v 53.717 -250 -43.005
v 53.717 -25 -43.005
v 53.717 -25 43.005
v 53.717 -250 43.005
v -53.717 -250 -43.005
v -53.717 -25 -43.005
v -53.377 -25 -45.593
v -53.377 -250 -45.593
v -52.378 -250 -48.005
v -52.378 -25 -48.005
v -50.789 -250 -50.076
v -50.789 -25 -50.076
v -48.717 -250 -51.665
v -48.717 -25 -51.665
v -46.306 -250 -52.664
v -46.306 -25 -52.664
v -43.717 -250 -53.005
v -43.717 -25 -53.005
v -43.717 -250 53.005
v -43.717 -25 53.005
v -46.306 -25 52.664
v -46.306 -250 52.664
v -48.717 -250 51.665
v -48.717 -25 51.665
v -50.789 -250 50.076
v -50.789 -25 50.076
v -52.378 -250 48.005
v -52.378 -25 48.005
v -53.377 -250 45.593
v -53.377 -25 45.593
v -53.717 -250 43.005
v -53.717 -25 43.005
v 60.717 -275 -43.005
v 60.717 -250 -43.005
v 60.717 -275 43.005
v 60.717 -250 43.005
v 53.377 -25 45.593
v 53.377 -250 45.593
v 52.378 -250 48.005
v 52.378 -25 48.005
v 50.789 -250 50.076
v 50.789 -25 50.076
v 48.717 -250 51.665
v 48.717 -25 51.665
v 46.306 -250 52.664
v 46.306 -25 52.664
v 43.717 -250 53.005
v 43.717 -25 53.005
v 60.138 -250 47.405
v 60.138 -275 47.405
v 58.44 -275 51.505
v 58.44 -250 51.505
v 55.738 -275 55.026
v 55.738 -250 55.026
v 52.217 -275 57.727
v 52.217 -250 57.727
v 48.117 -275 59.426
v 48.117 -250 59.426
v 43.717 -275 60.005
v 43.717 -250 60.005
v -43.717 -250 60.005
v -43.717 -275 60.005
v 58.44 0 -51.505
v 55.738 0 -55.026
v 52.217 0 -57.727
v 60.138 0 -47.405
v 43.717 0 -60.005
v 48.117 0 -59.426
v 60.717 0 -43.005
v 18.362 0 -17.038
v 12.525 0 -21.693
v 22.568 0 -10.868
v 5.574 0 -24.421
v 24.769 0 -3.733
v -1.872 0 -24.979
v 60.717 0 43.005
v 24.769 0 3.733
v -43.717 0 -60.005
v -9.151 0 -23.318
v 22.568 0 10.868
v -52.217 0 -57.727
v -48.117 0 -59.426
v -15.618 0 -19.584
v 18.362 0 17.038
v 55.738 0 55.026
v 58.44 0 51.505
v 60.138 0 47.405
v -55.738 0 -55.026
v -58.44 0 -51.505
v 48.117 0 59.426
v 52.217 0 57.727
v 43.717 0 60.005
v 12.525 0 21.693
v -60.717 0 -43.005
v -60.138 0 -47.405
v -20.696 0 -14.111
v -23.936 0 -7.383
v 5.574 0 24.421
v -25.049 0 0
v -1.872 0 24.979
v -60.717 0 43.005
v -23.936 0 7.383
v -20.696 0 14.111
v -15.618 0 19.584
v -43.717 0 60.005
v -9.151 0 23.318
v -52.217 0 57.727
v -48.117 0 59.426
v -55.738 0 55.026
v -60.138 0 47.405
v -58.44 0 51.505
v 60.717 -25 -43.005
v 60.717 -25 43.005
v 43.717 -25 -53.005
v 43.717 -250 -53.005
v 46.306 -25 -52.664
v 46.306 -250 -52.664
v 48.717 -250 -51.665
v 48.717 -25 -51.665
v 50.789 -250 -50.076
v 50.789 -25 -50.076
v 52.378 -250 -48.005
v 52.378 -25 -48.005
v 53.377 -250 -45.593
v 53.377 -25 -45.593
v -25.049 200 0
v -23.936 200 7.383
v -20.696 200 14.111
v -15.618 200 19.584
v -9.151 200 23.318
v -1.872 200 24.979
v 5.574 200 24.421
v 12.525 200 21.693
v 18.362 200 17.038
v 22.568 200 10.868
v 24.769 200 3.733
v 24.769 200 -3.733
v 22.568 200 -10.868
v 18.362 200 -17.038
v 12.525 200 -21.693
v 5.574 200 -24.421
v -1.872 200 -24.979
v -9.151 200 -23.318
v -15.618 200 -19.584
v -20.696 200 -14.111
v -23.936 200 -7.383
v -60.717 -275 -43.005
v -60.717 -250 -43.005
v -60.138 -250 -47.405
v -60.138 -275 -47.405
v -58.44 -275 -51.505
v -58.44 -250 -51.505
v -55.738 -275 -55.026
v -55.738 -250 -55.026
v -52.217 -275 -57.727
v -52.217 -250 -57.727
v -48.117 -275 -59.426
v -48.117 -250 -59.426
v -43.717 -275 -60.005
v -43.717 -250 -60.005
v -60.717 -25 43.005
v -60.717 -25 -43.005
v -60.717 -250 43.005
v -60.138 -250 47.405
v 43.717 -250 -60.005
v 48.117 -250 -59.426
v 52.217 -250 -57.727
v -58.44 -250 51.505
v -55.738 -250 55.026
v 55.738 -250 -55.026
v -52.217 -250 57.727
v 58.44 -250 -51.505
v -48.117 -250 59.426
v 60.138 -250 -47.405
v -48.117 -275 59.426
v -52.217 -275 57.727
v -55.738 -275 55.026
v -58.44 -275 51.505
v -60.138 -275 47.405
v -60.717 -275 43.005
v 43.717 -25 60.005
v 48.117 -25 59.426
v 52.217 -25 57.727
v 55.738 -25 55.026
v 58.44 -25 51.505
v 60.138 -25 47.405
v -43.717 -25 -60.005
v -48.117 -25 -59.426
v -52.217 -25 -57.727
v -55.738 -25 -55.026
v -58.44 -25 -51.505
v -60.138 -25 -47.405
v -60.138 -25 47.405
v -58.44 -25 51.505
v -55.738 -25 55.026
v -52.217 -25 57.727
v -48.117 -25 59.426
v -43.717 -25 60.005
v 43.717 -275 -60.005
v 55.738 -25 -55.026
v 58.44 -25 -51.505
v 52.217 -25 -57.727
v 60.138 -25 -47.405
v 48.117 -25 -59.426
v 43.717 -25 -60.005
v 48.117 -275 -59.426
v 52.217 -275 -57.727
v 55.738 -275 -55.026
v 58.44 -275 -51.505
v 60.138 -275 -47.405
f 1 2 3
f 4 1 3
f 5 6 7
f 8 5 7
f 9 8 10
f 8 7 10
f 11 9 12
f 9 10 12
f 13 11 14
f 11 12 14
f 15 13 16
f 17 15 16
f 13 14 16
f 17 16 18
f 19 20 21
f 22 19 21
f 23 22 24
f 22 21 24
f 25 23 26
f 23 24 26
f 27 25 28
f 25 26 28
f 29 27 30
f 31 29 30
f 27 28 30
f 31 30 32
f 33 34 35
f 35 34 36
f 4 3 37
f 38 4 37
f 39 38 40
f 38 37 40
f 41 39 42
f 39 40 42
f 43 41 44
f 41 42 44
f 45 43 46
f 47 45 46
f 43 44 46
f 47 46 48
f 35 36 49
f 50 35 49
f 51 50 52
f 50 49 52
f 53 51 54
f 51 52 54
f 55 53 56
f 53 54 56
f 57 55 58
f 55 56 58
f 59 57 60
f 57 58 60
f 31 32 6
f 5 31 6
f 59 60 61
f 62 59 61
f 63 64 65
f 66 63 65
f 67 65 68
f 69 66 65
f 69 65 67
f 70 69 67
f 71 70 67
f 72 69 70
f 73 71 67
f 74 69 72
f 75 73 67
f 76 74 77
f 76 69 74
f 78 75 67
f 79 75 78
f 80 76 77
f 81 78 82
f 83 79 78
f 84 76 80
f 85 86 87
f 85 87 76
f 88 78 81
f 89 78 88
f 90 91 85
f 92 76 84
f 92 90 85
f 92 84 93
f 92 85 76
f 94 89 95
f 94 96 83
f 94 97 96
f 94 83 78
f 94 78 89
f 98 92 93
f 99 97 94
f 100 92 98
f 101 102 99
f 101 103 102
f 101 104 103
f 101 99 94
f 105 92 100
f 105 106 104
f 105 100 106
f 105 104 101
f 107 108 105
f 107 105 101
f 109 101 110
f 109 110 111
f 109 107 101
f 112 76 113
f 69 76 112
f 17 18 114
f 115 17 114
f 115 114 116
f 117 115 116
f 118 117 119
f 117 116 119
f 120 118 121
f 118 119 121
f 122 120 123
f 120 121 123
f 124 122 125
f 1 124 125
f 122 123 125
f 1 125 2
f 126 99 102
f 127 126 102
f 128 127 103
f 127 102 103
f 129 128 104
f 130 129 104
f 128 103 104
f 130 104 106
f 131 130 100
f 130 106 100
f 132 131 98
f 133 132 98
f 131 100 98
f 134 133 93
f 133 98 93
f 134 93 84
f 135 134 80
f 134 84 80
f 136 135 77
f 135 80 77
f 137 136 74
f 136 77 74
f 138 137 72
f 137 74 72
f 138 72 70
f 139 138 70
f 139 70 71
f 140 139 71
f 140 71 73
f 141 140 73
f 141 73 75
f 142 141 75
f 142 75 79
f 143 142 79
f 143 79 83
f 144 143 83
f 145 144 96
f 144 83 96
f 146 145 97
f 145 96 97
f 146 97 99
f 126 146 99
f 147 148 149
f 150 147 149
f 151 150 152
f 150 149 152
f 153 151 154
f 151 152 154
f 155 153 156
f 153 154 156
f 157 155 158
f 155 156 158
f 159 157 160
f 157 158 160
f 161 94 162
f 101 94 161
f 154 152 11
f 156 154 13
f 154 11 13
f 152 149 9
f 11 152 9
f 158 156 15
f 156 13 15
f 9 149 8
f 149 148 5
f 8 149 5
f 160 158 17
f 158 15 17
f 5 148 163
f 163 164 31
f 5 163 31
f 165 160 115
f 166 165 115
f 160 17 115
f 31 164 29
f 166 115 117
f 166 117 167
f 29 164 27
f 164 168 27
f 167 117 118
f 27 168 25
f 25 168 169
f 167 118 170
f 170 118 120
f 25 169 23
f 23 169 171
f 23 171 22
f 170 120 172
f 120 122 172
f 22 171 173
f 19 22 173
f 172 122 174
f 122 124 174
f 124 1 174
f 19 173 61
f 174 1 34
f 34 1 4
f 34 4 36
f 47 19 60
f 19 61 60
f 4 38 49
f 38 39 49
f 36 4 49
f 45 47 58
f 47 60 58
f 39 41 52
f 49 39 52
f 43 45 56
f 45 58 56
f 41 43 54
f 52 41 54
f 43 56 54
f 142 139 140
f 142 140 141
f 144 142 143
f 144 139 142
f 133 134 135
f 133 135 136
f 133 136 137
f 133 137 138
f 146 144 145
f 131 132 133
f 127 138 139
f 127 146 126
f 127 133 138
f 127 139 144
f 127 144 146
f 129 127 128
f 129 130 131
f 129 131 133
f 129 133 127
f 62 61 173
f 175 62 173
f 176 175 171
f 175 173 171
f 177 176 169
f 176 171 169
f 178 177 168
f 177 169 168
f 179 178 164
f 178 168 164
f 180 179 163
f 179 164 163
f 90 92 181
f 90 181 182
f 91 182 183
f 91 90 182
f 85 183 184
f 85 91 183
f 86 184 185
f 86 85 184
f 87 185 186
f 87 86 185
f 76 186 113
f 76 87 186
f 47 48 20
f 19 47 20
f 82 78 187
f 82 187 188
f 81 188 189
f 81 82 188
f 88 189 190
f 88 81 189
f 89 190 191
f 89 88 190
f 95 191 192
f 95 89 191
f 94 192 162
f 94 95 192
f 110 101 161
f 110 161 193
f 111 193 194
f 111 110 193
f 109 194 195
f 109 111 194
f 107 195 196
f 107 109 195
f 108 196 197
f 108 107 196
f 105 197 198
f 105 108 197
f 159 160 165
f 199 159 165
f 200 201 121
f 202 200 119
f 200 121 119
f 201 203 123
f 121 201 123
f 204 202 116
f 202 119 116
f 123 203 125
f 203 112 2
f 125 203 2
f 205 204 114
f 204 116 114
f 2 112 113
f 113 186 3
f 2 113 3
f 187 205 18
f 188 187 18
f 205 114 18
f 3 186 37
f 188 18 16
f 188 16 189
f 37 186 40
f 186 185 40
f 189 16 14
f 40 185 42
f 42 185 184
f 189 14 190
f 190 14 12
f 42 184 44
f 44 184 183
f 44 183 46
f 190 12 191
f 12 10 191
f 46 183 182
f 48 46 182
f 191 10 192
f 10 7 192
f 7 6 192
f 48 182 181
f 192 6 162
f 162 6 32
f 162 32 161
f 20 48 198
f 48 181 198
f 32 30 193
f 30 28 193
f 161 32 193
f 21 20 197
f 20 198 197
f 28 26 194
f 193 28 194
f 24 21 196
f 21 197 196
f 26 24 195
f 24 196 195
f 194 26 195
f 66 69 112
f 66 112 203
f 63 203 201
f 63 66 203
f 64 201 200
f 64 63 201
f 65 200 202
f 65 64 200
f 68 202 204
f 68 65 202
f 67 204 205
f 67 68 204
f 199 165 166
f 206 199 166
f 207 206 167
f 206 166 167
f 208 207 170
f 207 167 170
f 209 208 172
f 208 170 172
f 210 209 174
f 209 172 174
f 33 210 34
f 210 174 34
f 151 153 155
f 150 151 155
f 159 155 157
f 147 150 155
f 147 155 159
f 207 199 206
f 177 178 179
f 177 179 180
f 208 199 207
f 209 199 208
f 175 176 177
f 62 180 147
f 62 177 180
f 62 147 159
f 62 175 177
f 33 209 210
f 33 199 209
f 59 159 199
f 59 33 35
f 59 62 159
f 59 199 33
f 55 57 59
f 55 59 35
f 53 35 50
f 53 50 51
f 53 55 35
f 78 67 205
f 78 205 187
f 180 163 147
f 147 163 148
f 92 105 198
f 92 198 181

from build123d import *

# Parameters (mm, degrees)
F1_DEPTH = 250
F4_DEPTH = 25
F5_R     = 25.0490469986
F6_DEPTH = 200


with BuildPart() as f1:
    # F0 (on Front) → F1 (new body)
    with BuildSketch(Plane.XZ):
        with BuildLine():
            ThreePointArc((53.7174828351, 43.0048087239), (50.7885506469, 50.0758765358), (43.7174828351, 53.0048087239))
            Line((43.7174828351, 53.0048087239), (-43.7174828351, 53.0048087239))
            ThreePointArc((-43.7174828351, 53.0048087239), (-50.7885506469, 50.0758765358), (-53.7174828351, 43.0048087239))
            Line((-53.7174828351, 43.0048087239), (-53.7174828351, -43.0048087239))
            ThreePointArc((-53.7174828351, -43.0048087239), (-50.7885506469, -50.0758765358), (-43.7174828351, -53.0048087239))
            Line((-43.7174828351, -53.0048087239), (43.7174828351, -53.0048087239))
            ThreePointArc((43.7174828351, -53.0048087239), (50.7885506469, -50.0758765358), (53.7174828351, -43.0048087239))
            Line((53.7174828351, -43.0048087239), (53.7174828351, 43.0048087239))
        make_face()
    extrude(amount=F1_DEPTH)

    # F2 (on face) + F3 (on face) → F4 (join)
    with BuildSketch(Plane.XZ.offset(250)):
        with BuildLine():
            Line((-60.7174821198, 43.0048087239), (-60.7174821198, -43.0048087239))
            ThreePointArc((-60.7174821198, -43.0048087239), (-55.7382976095, -55.0256234983), (-43.7174828351, -60.0048080087))
            Line((-43.7174828351, -60.0048080087), (43.7174828351, -60.0048080087))
            ThreePointArc((43.7174828351, -60.0048080087), (55.7382976095, -55.0256234983), (60.7174821198, -43.0048087239))
            Line((60.7174821198, -43.0048087239), (60.7174821198, 43.0048087239))
            ThreePointArc((60.7174821198, 43.0048087239), (55.7382976095, 55.0256234983), (43.7174828351, 60.0048080087))
            Line((43.7174828351, 60.0048080087), (-43.7174828351, 60.0048080087))
            ThreePointArc((-43.7174828351, 60.0048080087), (-55.7382976095, 55.0256234983), (-60.7174821198, 43.0048087239))
        make_face()
    with BuildSketch(Plane(origin=(0, 0, 0), x_dir=(-1, 0, 0), z_dir=(0, 1, 0))):
        with BuildLine():
            Line((-60.7174821198, 43.0048087239), (-60.7174821198, -43.0048087239))
            ThreePointArc((-60.7174821198, -43.0048087239), (-55.7382976095, -55.0256234983), (-43.7174828351, -60.0048080087))
            Line((-43.7174828351, -60.0048080087), (43.7174828351, -60.0048080087))
            ThreePointArc((43.7174828351, -60.0048080087), (55.7382976095, -55.0256234983), (60.7174821198, -43.0048087239))
            Line((60.7174821198, -43.0048087239), (60.7174821198, 43.0048087239))
            ThreePointArc((60.7174821198, 43.0048087239), (55.7382976095, 55.0256234983), (43.7174828351, 60.0048080087))
            Line((43.7174828351, 60.0048080087), (-43.7174828351, 60.0048080087))
            ThreePointArc((-43.7174828351, 60.0048080087), (-55.7382976095, 55.0256234983), (-60.7174821198, 43.0048087239))
        make_face()
    extrude(amount=F4_DEPTH, dir=(0, -1, 0))

    # F5 (on face) → F6 (join)
    with BuildSketch(Plane(origin=(0, 0, 0), x_dir=(-1, 0, 0), z_dir=(0, 1, 0))):
        Circle(F5_R)
    extrude(amount=F6_DEPTH)


solid = f1.part
